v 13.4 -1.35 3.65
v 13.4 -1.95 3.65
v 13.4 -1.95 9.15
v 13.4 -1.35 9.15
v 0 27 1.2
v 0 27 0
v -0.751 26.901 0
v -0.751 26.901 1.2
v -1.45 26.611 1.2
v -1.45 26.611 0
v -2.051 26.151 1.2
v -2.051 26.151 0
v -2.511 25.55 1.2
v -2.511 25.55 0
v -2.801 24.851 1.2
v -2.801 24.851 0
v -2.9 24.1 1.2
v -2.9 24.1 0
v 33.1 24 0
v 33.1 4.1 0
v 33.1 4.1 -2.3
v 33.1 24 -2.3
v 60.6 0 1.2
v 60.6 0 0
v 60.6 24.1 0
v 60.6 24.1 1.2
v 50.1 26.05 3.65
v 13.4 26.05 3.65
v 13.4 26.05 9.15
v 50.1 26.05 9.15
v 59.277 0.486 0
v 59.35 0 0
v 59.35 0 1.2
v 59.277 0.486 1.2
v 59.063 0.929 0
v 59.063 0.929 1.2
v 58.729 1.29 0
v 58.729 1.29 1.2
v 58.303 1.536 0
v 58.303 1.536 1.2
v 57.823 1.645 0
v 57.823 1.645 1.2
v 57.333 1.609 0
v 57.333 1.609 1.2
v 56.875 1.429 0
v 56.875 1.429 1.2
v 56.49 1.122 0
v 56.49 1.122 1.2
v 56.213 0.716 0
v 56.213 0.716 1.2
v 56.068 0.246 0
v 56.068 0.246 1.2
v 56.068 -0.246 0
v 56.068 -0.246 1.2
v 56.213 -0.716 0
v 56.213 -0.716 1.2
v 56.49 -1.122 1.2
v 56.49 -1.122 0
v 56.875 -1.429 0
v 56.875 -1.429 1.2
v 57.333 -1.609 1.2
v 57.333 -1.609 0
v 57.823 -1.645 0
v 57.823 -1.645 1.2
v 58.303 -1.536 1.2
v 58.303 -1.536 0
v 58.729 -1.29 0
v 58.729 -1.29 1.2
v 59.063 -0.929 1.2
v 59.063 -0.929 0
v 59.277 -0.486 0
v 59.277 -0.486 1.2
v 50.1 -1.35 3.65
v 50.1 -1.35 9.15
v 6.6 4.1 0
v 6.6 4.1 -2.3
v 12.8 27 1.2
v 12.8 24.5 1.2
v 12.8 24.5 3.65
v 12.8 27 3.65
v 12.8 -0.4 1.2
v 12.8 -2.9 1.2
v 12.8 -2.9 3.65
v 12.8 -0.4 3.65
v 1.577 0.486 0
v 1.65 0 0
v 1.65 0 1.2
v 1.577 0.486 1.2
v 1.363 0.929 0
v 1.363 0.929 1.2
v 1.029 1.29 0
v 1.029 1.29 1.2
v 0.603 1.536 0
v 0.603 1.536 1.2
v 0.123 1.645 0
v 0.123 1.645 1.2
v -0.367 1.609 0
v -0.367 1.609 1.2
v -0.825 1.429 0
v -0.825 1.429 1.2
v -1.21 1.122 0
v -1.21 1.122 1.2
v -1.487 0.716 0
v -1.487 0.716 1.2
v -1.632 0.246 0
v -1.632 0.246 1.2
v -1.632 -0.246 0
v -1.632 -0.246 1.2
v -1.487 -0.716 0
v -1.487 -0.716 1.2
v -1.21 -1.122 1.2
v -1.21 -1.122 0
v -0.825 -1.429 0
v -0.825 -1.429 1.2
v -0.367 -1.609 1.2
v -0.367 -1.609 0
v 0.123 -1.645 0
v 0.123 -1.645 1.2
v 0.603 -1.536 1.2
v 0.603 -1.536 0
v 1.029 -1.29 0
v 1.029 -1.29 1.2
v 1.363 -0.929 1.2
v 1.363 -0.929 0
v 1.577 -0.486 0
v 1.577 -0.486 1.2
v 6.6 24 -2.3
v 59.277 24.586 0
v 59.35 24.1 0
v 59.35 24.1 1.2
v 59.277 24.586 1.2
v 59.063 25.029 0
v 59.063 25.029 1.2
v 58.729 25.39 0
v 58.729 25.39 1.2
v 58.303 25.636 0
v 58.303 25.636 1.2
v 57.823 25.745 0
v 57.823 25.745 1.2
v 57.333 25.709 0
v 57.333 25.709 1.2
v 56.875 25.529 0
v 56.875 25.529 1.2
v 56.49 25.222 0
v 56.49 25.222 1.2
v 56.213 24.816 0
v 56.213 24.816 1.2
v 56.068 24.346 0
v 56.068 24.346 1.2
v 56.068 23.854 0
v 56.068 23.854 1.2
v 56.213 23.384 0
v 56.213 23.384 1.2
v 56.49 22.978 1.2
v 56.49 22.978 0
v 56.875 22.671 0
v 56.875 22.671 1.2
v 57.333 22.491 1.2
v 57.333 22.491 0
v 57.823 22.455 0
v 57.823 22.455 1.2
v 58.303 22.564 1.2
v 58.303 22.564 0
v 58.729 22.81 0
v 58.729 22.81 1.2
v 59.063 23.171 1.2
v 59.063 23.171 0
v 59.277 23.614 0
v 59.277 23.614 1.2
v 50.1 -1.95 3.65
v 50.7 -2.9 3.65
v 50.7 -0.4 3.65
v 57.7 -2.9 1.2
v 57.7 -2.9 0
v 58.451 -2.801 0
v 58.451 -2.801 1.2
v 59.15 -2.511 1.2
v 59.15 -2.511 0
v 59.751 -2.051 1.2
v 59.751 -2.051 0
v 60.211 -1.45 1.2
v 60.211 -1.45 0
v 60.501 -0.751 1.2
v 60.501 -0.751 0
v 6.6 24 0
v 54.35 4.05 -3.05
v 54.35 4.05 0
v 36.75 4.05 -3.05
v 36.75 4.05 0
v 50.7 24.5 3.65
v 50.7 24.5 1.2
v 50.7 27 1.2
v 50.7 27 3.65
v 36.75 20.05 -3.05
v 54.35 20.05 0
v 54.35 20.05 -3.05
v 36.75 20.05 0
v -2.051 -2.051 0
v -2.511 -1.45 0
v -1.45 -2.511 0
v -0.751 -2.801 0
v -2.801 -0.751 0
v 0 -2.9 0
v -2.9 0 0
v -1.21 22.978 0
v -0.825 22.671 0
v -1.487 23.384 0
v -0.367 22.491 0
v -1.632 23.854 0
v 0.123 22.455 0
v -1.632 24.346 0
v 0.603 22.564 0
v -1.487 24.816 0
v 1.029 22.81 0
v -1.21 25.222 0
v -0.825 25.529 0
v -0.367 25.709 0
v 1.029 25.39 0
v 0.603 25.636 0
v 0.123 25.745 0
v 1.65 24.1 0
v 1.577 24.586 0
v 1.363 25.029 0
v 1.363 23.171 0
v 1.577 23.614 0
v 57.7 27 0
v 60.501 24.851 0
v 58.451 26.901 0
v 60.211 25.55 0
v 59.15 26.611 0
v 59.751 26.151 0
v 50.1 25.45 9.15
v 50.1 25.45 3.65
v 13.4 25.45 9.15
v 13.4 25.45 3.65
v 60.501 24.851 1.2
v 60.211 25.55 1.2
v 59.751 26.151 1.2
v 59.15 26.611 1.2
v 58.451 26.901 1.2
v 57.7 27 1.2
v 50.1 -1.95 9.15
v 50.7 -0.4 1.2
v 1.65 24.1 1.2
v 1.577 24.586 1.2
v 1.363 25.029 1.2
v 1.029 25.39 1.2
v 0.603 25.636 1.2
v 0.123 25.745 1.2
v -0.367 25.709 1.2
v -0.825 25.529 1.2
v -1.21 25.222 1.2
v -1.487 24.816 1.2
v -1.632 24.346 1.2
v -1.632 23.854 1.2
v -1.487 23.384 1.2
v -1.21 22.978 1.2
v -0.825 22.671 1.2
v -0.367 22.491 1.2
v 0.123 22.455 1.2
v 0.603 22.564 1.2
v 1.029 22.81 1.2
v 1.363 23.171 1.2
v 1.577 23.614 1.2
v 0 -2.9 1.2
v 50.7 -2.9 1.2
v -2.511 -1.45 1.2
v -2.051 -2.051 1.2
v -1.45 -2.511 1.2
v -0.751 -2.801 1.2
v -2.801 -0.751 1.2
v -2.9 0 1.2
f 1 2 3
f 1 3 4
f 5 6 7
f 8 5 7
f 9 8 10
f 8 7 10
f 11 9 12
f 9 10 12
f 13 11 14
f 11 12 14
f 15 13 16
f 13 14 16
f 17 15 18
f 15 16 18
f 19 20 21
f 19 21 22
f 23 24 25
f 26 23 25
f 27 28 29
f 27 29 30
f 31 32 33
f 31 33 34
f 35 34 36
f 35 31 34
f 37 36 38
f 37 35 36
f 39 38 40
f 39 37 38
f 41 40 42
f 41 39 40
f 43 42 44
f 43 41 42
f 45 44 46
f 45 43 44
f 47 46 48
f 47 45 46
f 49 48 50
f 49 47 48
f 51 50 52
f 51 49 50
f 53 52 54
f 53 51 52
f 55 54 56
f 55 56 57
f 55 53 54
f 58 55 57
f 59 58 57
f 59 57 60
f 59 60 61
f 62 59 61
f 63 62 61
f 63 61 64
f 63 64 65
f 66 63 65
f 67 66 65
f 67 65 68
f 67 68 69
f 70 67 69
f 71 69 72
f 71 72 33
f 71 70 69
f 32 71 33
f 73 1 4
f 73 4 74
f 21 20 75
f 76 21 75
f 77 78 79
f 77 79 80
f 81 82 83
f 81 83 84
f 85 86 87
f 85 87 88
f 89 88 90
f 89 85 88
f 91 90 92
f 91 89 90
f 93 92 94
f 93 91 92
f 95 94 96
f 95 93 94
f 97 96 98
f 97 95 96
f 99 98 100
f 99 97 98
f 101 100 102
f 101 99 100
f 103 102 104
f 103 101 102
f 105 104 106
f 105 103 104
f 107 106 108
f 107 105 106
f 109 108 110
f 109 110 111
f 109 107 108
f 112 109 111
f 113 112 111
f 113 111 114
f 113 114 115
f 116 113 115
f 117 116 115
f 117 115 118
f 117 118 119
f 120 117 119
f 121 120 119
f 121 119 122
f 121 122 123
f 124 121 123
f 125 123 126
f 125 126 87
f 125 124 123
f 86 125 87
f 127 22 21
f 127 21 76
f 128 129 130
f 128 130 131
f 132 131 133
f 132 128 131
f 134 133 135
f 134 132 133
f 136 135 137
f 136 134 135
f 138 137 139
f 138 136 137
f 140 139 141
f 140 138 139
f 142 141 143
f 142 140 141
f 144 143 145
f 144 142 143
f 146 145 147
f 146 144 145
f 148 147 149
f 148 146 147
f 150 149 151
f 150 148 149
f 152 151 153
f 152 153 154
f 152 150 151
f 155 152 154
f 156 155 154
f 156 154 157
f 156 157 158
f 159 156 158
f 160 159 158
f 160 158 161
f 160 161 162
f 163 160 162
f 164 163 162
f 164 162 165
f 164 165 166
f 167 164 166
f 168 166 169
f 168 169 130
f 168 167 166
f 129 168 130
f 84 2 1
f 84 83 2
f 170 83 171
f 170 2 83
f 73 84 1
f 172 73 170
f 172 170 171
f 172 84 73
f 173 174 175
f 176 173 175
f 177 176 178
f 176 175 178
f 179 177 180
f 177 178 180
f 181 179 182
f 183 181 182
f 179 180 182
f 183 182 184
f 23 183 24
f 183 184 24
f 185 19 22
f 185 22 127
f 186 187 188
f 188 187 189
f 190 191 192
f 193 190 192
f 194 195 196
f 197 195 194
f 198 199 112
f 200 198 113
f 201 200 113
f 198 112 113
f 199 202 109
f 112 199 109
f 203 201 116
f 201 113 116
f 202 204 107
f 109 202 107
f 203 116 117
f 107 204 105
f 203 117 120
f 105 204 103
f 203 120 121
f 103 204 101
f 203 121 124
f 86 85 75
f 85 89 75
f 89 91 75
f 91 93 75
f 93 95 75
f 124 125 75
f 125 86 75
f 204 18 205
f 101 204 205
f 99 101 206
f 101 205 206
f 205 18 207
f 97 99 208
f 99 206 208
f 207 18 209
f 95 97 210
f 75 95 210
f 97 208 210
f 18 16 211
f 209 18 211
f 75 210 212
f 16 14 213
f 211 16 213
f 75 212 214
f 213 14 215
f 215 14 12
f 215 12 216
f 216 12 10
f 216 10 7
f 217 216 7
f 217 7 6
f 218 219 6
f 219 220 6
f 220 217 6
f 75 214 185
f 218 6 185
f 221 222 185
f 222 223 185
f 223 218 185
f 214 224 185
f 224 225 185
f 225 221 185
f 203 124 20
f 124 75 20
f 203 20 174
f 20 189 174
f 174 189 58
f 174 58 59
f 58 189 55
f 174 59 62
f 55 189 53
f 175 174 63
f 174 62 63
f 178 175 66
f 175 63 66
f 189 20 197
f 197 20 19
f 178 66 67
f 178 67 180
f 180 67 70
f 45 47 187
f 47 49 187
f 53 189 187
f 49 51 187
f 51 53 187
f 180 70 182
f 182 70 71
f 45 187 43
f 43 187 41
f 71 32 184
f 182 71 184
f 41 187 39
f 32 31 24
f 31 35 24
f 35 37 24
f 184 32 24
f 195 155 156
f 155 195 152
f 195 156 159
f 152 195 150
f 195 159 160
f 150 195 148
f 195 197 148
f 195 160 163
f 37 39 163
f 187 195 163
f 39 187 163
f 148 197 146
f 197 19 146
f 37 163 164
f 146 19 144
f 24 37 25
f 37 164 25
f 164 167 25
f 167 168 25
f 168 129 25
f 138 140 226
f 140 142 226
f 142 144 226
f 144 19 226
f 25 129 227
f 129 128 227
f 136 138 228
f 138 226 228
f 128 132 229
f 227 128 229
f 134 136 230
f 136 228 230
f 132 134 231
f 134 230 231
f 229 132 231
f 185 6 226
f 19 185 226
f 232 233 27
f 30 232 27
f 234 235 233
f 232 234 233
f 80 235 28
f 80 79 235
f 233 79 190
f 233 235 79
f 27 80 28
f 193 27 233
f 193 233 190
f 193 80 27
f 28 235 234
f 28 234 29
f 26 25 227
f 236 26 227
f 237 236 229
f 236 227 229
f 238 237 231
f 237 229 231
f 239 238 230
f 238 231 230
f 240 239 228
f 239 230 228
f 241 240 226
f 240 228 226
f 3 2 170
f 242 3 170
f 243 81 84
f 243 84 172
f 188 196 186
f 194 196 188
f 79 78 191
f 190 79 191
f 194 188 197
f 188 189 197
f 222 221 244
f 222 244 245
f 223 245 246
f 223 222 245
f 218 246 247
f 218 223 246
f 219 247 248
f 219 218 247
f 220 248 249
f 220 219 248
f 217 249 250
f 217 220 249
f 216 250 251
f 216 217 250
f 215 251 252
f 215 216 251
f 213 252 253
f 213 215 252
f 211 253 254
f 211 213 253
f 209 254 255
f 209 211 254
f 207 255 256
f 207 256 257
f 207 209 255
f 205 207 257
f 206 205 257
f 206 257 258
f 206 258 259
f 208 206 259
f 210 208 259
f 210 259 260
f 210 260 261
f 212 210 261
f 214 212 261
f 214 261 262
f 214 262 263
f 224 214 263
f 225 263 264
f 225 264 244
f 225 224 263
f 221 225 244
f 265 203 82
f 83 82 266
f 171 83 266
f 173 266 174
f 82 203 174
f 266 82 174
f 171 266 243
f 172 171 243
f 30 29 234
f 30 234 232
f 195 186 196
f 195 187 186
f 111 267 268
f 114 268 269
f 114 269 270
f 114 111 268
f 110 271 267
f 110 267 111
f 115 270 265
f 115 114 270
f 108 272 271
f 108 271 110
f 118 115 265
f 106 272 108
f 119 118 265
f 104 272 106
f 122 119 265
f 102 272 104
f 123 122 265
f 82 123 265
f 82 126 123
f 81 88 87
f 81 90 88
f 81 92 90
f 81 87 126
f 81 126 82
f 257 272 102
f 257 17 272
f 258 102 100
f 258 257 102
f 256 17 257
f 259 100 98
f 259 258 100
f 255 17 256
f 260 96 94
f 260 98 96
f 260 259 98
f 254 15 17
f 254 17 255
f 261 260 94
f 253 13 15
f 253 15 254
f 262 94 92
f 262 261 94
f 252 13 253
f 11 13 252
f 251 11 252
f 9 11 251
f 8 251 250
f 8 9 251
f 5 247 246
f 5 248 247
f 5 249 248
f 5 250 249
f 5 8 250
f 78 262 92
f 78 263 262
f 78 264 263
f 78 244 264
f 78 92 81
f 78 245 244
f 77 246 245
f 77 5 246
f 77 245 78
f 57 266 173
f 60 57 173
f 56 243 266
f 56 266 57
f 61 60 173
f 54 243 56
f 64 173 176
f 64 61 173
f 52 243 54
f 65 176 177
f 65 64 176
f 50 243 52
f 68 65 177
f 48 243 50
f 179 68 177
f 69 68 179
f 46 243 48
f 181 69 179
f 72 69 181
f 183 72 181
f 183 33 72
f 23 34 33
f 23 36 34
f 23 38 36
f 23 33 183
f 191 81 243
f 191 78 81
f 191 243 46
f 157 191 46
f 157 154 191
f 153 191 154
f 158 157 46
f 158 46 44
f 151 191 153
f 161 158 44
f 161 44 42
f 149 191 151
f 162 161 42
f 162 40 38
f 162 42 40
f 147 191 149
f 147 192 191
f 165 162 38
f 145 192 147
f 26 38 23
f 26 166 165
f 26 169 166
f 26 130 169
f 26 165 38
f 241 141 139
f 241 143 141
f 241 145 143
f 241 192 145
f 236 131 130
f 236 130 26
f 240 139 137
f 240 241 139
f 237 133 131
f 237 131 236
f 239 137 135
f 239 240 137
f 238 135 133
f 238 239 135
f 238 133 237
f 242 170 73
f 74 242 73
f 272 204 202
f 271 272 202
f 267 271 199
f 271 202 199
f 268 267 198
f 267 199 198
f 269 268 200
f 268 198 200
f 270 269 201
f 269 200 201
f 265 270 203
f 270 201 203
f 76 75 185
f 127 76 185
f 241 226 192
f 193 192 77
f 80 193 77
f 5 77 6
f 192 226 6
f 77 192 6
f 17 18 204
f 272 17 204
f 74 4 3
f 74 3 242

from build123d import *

# Parameters (mm, degrees)
SKETCH_1_R      = 1.65
EXTRUDE_1_DEPTH = 1.2
SKETCH_2_W      = 17.6
SKETCH_2_H      = 16
SKETCH_2_W_2    = 26.5
SKETCH_2_H_2    = 19.9
EXTRUDE_2_DEPTH = 2.3
SKETCH_3_W      = 17.6
SKETCH_3_H      = 16
EXTRUDE_3_DEPTH = 0.75
SKETCH_5_W      = 37.9
SKETCH_5_H      = 2.5
EXTRUDE_4_DEPTH = 2.45
SKETCH_6_W      = 36.7
SKETCH_6_H      = 0.6
EXTRUDE_5_DEPTH = 5.5


with BuildPart() as part:
    # 草图1 → 凸台-拉伸1 (new body)
    with BuildSketch(Plane.XY):
        with BuildLine():
            Line((0, -2.9), (57.7, -2.9))
            ThreePointArc((57.7, -2.9), (59.750609665, -2.050609665), (60.6, 0))
            Line((60.6, 0), (60.6, 24.1))
            ThreePointArc((60.6, 24.1), (59.750609665, 26.150609665), (57.7, 27))
            Line((57.7, 27), (0, 27))
            ThreePointArc((0, 27), (-2.050609665, 26.150609665), (-2.9, 24.1))
            Line((-2.9, 24.1), (-2.9, 0))
            ThreePointArc((-2.9, 0), (-2.050609665, -2.050609665), (0, -2.9))
        make_face()
        Circle(SKETCH_1_R, mode=Mode.SUBTRACT)
        with Locations((57.7, 0)):
            Circle(SKETCH_1_R, mode=Mode.SUBTRACT)
        with Locations((57.7, 24.1)):
            Circle(SKETCH_1_R, mode=Mode.SUBTRACT)
        with Locations((0, 24.1)):
            Circle(SKETCH_1_R, mode=Mode.SUBTRACT)
    extrude(amount=EXTRUDE_1_DEPTH)

    # 草图2 → 凸台-拉伸2 (add)
    with BuildSketch(Plane(origin=(0, 0, 0), x_dir=(-1, 0, 0), z_dir=(0, 0, -1))):
        with Locations((-45.55, 12.05)):
            Rectangle(SKETCH_2_W, SKETCH_2_H)
        with Locations((-19.85, 14.05)):
            Rectangle(SKETCH_2_W_2, SKETCH_2_H_2)
    extrude(amount=EXTRUDE_2_DEPTH)

    # 草图3 → 凸台-拉伸3 (add)
    with BuildSketch(Plane(origin=(0, 0, -2.3), x_dir=(-1, 0, 0), z_dir=(0, 0, -1))):
        with Locations((-45.55, 12.05)):
            Rectangle(SKETCH_3_W, SKETCH_3_H)
    extrude(amount=EXTRUDE_3_DEPTH)

    # 草图5 → 凸台-拉伸4 (add)
    with BuildSketch(Plane.XY.offset(1.2)):
        with Locations((31.75, 25.75)):
            Rectangle(SKETCH_5_W, SKETCH_5_H)
        with Locations((31.75, -1.65)):
            Rectangle(SKETCH_5_W, SKETCH_5_H)
    extrude(amount=EXTRUDE_4_DEPTH)

    # 草图6 → 凸台-拉伸5 (add)
    with BuildSketch(Plane.XY.offset(3.65)):
        with Locations((31.75, -1.65)):
            Rectangle(SKETCH_6_W, SKETCH_6_H)
        with Locations((31.75, 25.75)):
            Rectangle(SKETCH_6_W, SKETCH_6_H)
    extrude(amount=EXTRUDE_5_DEPTH)


solid = part.part
